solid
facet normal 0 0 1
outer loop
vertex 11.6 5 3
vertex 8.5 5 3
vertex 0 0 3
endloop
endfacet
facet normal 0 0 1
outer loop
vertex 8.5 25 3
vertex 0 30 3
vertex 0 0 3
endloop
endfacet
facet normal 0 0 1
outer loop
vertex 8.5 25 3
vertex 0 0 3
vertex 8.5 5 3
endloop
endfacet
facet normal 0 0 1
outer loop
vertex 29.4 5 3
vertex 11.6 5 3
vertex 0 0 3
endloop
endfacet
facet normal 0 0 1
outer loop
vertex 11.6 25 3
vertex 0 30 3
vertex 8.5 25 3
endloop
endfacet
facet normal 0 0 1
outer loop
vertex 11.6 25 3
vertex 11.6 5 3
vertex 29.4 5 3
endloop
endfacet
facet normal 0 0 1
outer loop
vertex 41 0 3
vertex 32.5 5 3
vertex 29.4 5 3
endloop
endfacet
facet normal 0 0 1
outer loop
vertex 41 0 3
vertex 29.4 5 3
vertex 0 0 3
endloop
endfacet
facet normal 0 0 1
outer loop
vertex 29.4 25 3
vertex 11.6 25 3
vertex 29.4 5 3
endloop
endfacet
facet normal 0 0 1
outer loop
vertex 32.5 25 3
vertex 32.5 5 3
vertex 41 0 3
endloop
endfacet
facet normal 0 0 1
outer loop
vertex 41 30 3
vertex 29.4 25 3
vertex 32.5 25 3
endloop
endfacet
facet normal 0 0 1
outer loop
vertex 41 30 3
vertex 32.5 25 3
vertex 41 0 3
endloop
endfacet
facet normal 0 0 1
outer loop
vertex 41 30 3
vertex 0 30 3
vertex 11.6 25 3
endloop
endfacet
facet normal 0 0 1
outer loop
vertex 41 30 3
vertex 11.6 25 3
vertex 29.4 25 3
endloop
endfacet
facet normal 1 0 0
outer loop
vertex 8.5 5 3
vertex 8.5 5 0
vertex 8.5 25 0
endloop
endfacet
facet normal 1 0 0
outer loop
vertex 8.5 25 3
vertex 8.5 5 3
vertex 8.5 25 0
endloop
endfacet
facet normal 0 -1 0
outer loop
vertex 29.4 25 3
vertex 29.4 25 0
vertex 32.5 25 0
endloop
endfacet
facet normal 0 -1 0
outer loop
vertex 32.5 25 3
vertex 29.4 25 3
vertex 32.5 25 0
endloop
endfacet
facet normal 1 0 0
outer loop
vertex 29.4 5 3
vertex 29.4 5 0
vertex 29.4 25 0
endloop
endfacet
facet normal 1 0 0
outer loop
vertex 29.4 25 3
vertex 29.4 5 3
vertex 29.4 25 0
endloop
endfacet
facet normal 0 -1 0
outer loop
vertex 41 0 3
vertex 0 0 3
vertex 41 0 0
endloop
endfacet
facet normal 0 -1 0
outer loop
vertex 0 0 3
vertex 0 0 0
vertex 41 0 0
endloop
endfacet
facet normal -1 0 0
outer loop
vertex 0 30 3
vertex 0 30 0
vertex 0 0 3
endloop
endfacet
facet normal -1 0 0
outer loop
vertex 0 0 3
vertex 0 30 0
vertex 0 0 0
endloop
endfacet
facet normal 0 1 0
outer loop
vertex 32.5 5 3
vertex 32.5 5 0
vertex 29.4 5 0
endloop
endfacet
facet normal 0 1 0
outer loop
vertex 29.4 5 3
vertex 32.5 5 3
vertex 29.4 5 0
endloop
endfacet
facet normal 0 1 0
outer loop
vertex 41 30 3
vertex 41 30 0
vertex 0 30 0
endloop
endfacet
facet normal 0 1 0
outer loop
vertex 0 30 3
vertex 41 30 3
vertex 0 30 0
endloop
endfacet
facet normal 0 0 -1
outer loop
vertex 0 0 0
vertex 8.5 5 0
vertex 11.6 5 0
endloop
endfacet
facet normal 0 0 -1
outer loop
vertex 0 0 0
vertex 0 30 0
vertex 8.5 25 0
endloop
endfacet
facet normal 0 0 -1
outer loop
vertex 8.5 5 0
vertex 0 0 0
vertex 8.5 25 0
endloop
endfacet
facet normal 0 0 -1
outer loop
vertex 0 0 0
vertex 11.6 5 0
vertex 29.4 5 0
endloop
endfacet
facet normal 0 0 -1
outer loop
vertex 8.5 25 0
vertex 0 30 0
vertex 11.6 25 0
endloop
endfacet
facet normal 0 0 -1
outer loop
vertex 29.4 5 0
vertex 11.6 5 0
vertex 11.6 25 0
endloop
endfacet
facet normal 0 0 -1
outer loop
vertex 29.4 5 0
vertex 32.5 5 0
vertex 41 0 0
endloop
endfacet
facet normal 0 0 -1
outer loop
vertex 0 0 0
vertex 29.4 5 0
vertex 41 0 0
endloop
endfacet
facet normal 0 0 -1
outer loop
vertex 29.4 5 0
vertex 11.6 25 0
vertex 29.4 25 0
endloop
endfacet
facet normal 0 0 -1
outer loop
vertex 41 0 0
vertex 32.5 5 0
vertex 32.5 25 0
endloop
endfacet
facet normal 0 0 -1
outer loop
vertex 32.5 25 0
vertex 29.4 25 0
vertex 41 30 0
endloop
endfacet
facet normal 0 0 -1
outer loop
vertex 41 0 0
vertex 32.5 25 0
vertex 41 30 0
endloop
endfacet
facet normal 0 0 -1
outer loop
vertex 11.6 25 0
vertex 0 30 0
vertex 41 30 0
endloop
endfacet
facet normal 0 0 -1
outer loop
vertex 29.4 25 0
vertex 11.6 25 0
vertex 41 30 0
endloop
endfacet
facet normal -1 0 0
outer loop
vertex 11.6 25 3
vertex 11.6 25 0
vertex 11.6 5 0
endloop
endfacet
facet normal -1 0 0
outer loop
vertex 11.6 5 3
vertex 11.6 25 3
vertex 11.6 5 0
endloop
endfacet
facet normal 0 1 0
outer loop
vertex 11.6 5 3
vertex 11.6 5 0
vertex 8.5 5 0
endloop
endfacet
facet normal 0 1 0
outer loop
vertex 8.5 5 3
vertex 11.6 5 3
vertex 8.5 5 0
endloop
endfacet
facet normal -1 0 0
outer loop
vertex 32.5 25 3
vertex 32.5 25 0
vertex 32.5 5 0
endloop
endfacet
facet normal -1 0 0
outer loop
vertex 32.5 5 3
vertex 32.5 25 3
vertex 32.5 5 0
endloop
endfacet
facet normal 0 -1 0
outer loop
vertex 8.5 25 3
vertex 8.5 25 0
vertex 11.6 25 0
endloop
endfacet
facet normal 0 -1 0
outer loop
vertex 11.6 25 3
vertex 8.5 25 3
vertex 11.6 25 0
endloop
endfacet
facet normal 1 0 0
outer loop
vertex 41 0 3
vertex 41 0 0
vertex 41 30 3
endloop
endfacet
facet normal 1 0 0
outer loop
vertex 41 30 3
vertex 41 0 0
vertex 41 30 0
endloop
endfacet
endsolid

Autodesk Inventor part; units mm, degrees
ref_plane "YZ Plane" through (0, 0, 0) normal (1, 0, 0) x (0, 1, 0)
ref_plane "XZ Plane" through (0, 0, 0) normal (0, 1, 0) x (-1, 0, 0)
ref_plane "XY Plane" through (0, 0, 0) normal (0, 0, 1) x (1, 0, 0)
sketch "Sketch1" plane through (0, 0, 0) normal (0, 0, 1) x (1, 0, 0)
  line L0 (0, 0) -> (41, 0)
  line L1 (41, 0) -> (41, 30)
  line L2 (41, 30) -> (0, 30)
  line L3 (0, 30) -> (0, 0)
  line L4 (29.4, 25) -> (32.5, 25)
  line L5 (32.5, 25) -> (32.5, 5)
  line L6 (32.5, 5) -> (29.4, 5)
  line L7 (29.4, 5) -> (29.4, 25)
  line L8 (8.5, 25) -> (11.6, 25)
  line L9 (11.6, 25) -> (11.6, 5)
  line L10 (11.6, 5) -> (8.5, 5)
  line L11 (8.5, 5) -> (8.5, 25)
  point P0 (8.5, 15)
  point P1 (0, 15)
  point P2 (29.4, 15)
  point P3 (10.05, 5)
  point P4 (20.5, 30)
  dimension "d0" = 41
  dimension "d1" = 30
  dimension "d2" = 3.1
  dimension "d3" = 3.1
  dimension "d4" = 24
  dimension "d6" = 10
  dimension "d7" = 8.9
extrude "Extrusion1" add sketch "Sketch1" along normal blind 3
properties part number "Moving_rail"
